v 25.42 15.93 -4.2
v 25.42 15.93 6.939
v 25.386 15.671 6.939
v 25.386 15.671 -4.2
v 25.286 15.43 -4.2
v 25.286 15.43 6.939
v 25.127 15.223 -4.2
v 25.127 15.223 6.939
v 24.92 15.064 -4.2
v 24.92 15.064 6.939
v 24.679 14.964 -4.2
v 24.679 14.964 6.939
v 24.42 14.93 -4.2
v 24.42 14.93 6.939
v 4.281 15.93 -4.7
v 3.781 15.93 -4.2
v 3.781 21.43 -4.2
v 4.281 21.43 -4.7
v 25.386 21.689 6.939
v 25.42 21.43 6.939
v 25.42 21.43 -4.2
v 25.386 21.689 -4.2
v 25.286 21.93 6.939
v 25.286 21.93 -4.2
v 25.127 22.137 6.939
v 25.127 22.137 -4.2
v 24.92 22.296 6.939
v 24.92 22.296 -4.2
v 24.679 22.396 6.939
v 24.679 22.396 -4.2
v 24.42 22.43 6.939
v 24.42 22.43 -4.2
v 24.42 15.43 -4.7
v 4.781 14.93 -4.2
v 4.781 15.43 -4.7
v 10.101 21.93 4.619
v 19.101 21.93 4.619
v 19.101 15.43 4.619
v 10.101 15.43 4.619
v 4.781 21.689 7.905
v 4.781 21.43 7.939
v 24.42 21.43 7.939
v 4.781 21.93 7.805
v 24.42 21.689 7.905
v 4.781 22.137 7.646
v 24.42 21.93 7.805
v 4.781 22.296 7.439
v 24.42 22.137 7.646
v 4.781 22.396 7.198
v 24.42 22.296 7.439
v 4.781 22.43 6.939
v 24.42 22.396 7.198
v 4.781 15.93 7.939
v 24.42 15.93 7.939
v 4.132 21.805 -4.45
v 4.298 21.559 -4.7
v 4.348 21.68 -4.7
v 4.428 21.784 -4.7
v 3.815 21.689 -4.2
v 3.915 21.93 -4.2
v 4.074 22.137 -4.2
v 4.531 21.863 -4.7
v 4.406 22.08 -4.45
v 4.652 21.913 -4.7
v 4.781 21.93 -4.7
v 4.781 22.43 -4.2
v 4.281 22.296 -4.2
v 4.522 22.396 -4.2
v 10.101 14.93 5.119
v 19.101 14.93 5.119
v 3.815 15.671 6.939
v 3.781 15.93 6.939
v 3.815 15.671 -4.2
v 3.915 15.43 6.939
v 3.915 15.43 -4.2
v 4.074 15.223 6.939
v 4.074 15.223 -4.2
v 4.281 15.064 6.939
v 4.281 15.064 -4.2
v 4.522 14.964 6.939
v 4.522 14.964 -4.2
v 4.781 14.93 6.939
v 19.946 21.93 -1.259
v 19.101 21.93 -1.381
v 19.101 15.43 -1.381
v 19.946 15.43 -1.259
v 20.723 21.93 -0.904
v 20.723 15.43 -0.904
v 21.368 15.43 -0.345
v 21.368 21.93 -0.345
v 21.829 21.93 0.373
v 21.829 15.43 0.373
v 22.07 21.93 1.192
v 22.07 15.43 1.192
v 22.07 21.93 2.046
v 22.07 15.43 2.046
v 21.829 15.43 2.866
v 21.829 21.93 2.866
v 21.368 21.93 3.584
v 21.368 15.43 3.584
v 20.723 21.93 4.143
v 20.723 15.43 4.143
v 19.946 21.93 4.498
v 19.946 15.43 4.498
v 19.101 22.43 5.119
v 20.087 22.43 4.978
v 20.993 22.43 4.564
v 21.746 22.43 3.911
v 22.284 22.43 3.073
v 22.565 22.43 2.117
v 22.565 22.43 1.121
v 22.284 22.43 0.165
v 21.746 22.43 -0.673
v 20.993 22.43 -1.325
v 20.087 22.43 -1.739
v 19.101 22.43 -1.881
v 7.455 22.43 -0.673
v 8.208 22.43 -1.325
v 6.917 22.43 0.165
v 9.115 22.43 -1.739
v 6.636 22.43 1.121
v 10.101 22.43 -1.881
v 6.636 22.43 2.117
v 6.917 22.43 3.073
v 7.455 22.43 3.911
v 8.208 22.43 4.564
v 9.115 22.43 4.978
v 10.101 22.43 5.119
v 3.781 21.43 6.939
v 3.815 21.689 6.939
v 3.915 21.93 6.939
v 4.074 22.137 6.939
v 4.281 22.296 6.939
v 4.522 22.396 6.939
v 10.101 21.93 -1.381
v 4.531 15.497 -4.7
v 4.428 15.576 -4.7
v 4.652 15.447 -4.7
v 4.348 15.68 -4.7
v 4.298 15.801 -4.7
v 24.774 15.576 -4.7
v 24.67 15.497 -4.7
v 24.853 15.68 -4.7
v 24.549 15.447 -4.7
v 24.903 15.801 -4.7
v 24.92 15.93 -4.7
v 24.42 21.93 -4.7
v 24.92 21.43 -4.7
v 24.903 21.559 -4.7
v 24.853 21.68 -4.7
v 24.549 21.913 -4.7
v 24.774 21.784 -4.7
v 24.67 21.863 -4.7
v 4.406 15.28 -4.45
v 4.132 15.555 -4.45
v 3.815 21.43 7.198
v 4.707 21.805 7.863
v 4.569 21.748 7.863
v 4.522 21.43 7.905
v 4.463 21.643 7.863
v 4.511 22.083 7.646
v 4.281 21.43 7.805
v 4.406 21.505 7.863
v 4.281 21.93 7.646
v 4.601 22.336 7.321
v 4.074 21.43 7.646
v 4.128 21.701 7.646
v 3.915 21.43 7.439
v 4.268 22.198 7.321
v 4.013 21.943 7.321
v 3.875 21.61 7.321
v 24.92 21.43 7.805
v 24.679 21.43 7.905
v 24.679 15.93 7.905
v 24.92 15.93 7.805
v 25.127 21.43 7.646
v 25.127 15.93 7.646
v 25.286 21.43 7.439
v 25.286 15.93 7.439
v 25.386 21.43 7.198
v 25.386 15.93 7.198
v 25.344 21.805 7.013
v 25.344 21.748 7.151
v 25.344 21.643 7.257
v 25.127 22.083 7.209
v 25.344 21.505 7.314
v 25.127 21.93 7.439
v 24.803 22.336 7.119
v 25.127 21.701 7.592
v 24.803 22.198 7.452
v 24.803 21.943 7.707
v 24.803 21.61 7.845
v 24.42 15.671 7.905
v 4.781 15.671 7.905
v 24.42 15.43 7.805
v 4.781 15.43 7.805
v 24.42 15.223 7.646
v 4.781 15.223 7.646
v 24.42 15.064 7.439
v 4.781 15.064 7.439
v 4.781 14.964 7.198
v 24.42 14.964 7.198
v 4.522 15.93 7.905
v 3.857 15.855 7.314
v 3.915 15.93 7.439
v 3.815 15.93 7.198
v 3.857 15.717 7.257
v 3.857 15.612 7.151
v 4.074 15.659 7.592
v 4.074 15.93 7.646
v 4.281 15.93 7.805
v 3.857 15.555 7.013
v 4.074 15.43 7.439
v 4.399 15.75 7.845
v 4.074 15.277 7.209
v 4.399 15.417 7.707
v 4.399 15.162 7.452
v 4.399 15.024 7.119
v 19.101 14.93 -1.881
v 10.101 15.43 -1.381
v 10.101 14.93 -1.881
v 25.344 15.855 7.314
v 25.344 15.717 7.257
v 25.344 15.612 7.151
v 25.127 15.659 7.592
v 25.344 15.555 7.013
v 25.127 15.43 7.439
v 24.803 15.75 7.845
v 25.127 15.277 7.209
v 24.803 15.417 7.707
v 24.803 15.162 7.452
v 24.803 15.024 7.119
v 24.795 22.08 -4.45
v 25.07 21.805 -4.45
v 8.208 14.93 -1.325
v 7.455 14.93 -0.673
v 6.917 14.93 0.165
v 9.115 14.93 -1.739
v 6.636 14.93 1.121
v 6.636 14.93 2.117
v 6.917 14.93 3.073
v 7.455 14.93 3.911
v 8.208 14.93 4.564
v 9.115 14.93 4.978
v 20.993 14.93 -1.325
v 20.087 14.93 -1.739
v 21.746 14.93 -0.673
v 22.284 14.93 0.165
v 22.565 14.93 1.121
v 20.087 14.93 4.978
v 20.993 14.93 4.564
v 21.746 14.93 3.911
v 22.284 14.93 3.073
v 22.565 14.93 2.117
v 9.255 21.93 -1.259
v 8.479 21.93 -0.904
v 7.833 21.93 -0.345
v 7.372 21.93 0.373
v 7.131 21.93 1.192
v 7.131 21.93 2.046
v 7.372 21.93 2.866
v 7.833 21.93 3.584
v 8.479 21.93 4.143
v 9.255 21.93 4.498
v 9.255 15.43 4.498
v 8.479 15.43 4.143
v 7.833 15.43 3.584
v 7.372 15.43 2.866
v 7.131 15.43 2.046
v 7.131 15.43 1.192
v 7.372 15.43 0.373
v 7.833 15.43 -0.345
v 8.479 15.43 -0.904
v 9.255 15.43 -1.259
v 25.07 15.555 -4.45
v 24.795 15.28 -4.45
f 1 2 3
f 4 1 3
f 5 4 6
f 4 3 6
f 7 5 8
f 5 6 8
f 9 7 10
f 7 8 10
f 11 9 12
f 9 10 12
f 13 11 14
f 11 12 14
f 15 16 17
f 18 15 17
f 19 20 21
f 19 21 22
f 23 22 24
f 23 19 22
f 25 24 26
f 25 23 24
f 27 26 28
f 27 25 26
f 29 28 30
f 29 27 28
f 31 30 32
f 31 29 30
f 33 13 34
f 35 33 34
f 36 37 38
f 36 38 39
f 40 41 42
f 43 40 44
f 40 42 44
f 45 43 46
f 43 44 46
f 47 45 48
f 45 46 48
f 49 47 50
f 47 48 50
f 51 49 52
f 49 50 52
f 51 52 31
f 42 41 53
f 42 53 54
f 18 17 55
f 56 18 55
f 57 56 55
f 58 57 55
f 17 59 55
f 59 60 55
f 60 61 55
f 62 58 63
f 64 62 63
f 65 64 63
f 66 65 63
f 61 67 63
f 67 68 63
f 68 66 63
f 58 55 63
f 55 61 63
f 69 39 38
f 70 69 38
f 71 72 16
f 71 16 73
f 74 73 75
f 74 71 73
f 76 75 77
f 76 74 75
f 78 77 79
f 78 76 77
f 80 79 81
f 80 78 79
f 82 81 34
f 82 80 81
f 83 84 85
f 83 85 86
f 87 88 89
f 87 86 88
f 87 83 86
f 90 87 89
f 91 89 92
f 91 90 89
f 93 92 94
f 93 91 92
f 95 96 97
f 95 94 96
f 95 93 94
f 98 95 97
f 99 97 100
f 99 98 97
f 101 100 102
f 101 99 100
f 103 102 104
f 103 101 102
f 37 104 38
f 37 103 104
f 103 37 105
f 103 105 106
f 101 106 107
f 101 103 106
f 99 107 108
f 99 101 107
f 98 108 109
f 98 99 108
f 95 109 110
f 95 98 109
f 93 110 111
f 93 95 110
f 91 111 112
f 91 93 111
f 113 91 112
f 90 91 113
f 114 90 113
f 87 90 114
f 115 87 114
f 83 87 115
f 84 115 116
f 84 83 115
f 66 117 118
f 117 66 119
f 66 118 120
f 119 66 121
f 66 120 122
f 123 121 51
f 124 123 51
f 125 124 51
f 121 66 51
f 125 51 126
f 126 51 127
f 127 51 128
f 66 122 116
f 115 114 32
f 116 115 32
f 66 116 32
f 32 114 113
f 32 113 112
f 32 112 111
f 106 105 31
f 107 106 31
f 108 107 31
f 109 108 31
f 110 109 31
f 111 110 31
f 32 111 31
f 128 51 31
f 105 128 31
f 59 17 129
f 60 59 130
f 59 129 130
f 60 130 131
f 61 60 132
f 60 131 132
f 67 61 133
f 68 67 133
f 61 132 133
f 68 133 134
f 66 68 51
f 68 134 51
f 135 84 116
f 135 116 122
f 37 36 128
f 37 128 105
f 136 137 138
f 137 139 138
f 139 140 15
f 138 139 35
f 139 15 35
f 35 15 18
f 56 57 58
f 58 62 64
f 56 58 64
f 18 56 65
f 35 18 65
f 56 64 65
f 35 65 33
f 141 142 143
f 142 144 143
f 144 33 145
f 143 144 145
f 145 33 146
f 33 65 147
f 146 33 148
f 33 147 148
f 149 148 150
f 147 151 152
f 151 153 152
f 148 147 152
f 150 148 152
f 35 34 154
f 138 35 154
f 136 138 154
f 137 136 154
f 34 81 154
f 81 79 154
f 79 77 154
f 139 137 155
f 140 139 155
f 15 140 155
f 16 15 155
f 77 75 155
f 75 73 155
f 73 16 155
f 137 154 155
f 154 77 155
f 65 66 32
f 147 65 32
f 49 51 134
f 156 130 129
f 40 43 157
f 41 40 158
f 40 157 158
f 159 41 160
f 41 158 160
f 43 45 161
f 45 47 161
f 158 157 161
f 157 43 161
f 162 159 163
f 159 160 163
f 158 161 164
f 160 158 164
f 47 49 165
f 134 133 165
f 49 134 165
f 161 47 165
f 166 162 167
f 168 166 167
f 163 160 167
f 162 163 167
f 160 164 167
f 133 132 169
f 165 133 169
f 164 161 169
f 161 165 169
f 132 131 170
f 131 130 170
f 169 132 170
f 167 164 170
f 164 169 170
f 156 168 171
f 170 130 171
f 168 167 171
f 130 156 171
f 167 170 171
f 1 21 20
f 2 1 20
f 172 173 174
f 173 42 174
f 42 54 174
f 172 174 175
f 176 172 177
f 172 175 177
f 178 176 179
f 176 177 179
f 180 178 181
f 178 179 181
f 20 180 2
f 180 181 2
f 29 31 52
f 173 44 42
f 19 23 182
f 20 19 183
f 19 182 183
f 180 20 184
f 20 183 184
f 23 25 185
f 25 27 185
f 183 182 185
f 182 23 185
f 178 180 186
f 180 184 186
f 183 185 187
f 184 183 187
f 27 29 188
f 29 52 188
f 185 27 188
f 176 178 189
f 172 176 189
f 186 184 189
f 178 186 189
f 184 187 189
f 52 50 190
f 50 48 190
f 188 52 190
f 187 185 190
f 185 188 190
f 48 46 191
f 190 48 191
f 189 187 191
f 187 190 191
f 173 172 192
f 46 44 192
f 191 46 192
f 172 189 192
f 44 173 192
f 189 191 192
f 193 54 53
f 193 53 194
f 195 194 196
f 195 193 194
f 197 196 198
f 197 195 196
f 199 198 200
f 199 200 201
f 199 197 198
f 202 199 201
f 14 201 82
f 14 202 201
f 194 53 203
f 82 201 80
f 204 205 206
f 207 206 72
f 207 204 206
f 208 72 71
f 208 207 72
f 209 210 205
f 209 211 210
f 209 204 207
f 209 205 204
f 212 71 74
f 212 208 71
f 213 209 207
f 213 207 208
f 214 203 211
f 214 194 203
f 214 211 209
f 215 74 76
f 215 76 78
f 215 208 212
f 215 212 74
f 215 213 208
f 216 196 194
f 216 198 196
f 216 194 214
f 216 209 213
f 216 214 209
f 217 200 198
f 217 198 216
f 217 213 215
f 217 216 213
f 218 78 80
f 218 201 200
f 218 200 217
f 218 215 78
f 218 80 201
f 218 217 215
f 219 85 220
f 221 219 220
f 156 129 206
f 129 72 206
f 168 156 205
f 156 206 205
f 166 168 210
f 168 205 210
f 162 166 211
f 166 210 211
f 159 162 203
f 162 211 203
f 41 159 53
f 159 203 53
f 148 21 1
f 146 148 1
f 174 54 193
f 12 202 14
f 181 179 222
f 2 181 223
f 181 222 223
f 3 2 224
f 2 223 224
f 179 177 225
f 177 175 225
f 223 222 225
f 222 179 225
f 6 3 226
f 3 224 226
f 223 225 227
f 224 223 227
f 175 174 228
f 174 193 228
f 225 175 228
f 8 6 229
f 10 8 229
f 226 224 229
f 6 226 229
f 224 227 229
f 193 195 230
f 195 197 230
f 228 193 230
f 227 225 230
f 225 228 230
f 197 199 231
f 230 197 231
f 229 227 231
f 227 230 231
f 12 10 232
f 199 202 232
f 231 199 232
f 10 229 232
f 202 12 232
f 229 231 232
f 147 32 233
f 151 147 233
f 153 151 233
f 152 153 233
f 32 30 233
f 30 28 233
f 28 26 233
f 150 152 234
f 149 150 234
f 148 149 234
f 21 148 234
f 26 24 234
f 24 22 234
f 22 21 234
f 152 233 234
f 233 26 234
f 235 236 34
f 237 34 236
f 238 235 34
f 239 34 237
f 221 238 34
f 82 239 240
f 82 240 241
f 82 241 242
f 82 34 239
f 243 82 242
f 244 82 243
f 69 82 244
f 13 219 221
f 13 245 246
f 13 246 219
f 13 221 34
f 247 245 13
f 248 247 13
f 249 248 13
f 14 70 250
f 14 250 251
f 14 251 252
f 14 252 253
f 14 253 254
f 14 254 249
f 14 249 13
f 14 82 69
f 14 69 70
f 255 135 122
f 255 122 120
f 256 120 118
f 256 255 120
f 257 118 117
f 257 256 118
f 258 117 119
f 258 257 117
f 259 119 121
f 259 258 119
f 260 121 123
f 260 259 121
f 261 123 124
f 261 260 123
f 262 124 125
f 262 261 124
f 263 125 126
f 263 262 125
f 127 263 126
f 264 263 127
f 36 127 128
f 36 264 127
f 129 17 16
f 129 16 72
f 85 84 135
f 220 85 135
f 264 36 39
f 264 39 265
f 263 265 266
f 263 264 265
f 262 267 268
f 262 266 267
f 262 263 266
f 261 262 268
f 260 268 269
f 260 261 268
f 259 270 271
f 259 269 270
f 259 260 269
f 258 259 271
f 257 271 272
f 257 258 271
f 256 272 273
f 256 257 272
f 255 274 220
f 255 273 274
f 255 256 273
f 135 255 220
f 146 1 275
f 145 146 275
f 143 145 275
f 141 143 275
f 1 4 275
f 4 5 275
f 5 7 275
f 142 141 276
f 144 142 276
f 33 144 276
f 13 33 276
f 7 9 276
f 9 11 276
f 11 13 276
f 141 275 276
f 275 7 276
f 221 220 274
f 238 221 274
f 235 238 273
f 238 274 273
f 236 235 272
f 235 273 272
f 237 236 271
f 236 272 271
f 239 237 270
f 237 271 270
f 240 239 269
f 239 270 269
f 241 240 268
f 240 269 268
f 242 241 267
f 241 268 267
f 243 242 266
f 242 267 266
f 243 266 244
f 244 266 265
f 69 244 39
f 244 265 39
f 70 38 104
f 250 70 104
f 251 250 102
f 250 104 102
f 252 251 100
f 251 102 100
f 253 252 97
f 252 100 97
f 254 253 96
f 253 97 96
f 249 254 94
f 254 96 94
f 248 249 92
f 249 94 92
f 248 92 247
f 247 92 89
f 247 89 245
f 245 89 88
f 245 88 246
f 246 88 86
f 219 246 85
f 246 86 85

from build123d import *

# Parameters (mm, degrees)
SKETCH004_W     = 21.638793
SKETCH004_H     = 12.638793
PAD003_DEPTH    = 7.5
FILLET002_R     = 1
CHAMFER003_SIZE = 0.5
CHAMFER004_SIZE = 0.5


with BuildPart() as part:
    # Sketch004 → Pad003 (new body)
    with BuildSketch(Plane.XZ):
        with Locations((-10.819396, 6.319396)):
            Rectangle(SKETCH004_W, SKETCH004_H)
        with BuildLine():
            ThreePointArc((-6.319396, 3.319396), (-3.319396, 6.319396), (-6.319396, 9.319396))
            Line((-6.319396, 9.319396), (-15.319396, 9.319396))
            ThreePointArc((-15.319396, 9.319396), (-18.319396, 6.319396), (-15.319396, 3.319396))
            Line((-6.319396, 3.319396), (-15.319396, 3.319396))
        make_face(mode=Mode.SUBTRACT)
    extrude(amount=PAD003_DEPTH)

    # Fillet002
    fillet002_edges = [part.edges().sort_by_distance(p)[0] for p in [
        (-21.638793, 0, 6.319396),
        (-10.819396, 0, 12.638793),
        (-10.819396, -7.5, 12.638793),
        (-21.638793, -3.75, 12.638793),
        (-21.638793, -7.5, 6.319396),
        (0, 0, 6.319396),
        (0, -3.75, 12.638793),
        (0, -7.5, 6.319396),
    ]]
    fillet(fillet002_edges, radius=FILLET002_R)

    # Chamfer003
    chamfer003_edges = [part.edges().sort_by_distance(p)[0] for p in [
        (-10.819396, 0, 0),
    ]]
    chamfer(chamfer003_edges, length=CHAMFER003_SIZE)

    # Chamfer004
    chamfer004_edges = [part.edges().sort_by_distance(p)[0] for p in [
        (-10.819396, 0, 3.319396),
        (-10.819396, -7.5, 3.319396),
    ]]
    chamfer(chamfer004_edges, length=CHAMFER004_SIZE)


with BuildPart() as part_1:
    # Body004 placement: moved
    add(part.part.moved(Location((25.42, 22.43, -4.7))))


solid = part_1.part
